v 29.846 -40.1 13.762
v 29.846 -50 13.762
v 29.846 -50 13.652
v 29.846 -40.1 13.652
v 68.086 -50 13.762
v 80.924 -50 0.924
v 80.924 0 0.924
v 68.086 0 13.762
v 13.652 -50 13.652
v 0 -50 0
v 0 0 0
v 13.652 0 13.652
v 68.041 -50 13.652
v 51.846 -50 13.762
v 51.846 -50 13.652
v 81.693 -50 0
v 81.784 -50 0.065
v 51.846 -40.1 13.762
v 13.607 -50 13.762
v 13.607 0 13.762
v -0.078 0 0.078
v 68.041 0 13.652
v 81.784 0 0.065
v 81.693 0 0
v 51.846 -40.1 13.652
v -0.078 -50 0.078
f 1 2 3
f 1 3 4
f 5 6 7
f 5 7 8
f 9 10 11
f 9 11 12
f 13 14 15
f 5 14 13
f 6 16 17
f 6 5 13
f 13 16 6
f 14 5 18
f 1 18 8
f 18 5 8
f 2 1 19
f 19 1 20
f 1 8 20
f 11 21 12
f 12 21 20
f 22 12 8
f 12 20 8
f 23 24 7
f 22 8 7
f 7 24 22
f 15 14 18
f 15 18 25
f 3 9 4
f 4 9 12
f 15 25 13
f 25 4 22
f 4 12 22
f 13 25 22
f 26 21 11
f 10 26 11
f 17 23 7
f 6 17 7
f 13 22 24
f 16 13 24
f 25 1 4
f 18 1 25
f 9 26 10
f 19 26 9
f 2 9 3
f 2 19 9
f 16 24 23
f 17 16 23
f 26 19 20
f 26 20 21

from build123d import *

# Parameters (mm, degrees)
F1_DEPTH = 50
F2_W     = 22
F2_H     = 9.5
F3_DEPTH = 13.7632765638
F4_DEPTH = 0.4


with BuildPart() as f1:
    # F0 (on Front) → F1 (new body)
    with BuildSketch(Plane.XZ):
        Polygon((-0.0777817459, 0.0777817459), (0, 0), (13.6522765638, 13.6522765638), (68.0406461445, 13.6522765638), (81.6929227083, 0), (81.7835545517, 0.0649316484), (80.9242431001, 0.9242431001), (68.0862096363, 13.7622765638), (13.606713072, 13.7622765638), align=None)
    extrude(amount=F1_DEPTH)

    # F2 (on face) → F3 (cut, through all)
    with BuildSketch(Plane.XY.offset(13.7622765638)):
        with Locations((40.8464613542, -45.25)):
            Rectangle(F2_W, F2_H)
    extrude(amount=-F3_DEPTH, mode=Mode.SUBTRACT)

    # F4 (cut): a face of the model
    f4_faces = [f1.faces().sort_by_distance(p)[0] for p in [
        (40.8464613542, -40.5, 13.7072765638),
    ]]
    extrude(f4_faces, amount=-F4_DEPTH, mode=Mode.SUBTRACT)


solid = f1.part
